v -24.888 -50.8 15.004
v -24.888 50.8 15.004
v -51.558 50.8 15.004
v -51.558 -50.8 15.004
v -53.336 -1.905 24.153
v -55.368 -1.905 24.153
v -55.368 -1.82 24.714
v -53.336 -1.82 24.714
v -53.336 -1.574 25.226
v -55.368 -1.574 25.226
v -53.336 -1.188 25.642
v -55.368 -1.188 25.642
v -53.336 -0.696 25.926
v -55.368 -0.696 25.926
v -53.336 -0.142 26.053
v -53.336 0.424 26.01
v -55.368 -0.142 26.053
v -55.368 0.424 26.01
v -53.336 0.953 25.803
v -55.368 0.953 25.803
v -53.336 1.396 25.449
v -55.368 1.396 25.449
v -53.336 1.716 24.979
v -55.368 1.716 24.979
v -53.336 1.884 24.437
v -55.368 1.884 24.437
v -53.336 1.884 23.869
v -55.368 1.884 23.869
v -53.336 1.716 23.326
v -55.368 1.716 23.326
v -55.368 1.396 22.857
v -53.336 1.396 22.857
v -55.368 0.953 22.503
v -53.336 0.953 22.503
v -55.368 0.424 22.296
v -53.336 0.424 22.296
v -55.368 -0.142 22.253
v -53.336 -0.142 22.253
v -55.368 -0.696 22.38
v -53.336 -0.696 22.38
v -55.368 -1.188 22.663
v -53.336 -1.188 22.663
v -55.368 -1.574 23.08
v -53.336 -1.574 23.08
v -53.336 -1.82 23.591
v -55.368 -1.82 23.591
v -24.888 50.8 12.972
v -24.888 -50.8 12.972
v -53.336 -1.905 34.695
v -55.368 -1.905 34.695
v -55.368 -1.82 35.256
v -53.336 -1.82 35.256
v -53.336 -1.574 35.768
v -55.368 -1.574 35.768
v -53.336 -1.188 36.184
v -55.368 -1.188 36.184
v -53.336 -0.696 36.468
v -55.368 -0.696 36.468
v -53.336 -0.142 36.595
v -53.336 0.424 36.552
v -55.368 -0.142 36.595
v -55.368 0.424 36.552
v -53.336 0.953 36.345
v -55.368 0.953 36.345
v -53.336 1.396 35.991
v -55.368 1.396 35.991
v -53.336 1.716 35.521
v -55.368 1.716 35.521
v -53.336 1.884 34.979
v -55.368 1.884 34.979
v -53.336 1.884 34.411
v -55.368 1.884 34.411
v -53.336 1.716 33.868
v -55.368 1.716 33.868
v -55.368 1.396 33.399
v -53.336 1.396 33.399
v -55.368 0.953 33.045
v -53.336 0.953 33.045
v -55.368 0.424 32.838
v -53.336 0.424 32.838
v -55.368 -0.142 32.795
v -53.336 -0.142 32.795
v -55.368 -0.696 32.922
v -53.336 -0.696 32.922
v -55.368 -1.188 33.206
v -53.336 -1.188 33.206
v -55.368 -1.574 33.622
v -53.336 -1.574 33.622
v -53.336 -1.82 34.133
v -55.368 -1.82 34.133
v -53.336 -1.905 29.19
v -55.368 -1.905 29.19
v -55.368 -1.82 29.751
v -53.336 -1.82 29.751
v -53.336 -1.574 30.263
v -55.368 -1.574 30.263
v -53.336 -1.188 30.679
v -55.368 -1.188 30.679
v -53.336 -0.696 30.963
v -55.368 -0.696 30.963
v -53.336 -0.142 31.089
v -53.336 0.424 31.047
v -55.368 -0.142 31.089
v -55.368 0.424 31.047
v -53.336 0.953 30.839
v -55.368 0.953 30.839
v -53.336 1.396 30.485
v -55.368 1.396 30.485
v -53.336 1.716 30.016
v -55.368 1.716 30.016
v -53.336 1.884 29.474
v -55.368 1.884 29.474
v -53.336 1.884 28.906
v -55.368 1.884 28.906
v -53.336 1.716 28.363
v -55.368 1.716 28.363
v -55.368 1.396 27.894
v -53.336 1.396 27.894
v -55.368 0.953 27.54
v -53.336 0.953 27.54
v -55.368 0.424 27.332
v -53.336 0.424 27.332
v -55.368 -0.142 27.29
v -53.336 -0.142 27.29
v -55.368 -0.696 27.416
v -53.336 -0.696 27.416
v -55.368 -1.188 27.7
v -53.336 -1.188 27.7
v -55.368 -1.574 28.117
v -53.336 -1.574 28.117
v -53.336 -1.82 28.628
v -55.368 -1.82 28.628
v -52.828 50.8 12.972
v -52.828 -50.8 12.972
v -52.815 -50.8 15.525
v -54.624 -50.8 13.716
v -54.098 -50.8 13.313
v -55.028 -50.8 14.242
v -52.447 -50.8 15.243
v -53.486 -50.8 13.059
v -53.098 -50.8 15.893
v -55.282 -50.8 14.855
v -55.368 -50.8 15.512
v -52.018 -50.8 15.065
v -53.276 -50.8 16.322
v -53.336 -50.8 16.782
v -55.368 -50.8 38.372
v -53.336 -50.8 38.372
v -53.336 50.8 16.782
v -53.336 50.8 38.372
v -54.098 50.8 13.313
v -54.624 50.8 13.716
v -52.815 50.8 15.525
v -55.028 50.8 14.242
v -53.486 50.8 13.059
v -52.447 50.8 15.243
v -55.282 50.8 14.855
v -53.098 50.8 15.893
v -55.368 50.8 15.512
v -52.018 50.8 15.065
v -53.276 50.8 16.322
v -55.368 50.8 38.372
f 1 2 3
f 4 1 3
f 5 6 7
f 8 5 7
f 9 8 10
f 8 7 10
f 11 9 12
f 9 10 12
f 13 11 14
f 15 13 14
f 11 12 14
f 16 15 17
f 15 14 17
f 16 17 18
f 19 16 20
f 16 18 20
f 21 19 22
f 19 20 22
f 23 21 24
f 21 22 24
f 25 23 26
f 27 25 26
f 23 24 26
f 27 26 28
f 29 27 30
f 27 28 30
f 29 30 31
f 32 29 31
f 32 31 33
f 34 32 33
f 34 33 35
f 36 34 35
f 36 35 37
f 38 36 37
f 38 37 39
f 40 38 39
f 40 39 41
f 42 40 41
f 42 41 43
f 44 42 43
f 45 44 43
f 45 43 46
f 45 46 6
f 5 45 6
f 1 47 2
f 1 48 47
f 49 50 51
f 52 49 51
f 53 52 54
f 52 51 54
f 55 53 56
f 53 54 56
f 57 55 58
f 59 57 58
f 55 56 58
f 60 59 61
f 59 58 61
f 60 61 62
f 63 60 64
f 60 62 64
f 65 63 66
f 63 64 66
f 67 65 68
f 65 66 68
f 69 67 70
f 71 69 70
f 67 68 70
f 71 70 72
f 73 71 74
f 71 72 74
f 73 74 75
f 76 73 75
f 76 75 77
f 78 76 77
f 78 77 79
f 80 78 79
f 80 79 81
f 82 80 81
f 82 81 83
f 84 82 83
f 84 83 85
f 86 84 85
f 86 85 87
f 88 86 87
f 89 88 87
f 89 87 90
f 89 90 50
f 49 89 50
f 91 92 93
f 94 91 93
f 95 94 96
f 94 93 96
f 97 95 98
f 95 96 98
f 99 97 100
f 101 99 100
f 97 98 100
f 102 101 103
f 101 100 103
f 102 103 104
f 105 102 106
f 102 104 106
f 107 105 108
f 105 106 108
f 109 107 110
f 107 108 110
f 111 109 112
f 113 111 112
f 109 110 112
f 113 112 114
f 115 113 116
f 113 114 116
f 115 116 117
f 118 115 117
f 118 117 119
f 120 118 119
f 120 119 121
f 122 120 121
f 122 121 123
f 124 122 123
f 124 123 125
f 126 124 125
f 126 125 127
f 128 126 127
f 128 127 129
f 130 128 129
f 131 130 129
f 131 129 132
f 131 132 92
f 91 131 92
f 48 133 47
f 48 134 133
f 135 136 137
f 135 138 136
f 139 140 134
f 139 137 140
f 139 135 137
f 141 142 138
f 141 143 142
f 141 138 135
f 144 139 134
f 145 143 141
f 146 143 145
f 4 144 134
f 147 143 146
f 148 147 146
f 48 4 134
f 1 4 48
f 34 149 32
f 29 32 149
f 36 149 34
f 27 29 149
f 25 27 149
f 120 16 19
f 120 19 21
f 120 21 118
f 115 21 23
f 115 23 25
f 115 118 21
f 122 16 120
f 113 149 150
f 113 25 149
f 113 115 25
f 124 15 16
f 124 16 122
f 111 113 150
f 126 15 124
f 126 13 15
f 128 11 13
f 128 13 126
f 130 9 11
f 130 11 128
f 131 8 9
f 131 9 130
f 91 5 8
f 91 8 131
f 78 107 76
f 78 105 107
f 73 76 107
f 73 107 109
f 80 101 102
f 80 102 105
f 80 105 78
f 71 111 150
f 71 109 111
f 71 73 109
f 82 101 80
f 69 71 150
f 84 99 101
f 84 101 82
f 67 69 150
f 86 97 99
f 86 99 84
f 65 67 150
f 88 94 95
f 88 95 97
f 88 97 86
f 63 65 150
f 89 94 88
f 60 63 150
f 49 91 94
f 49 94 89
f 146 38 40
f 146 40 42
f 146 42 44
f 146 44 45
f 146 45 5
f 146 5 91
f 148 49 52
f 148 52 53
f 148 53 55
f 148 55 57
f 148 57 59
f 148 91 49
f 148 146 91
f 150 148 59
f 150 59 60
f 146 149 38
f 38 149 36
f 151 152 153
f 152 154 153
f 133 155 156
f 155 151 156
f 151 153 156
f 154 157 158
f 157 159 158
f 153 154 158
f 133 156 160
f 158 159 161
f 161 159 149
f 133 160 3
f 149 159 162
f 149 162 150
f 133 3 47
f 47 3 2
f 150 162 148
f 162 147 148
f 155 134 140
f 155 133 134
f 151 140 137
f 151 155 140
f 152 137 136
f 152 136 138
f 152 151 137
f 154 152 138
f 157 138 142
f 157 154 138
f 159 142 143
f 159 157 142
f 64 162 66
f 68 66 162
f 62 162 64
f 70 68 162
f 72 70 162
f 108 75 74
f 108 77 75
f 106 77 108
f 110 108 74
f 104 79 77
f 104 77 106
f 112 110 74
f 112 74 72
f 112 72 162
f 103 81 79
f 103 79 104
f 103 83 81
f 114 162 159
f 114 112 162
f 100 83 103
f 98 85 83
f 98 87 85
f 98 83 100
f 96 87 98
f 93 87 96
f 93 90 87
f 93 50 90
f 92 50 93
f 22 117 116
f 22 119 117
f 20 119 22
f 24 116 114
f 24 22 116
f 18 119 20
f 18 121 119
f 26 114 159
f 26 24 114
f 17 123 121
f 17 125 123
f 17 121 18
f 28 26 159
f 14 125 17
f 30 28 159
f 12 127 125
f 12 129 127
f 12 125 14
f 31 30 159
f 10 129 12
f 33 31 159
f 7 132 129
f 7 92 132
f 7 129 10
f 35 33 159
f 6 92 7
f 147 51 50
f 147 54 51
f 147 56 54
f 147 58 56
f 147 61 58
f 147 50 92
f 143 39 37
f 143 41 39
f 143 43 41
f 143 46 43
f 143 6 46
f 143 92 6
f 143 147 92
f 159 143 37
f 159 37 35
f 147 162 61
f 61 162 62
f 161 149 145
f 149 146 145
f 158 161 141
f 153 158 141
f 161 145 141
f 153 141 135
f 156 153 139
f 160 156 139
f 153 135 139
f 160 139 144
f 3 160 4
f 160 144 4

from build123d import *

# Parameters (mm, degrees)
F0_W     = 28.448
F0_H     = 2.032
F0_W_2   = 2.032
F0_H_2   = 23.368
F1_DEPTH = 50.8
F2_R     = 2.54
F3_R     = 1.778
F5_D     = 3.81


with BuildPart() as f1:
    # F0 (on Front) → F1 (new body, symmetric)
    with BuildSketch(Plane.XZ):
        with Locations((-39.1122124221, 13.9883446444)):
            Rectangle(F0_W, F0_H)
        with Locations((-54.3522124221, 13.9883446444)):
            Rectangle(F0_W_2, F0_H)
        with Locations((-54.3522124221, 26.6883446444)):
            Rectangle(F0_W_2, F0_H_2)
    extrude(amount=F1_DEPTH, both=True)

    # F2
    f2_edges = [f1.edges().sort_by_distance(p)[0] for p in [
        (-55.368212, 0, 12.972345),
    ]]
    fillet(f2_edges, radius=F2_R)

    # F3
    f3_edges = [f1.edges().sort_by_distance(p)[0] for p in [
        (-53.336212, 0, 15.004345),
    ]]
    fillet(f3_edges, radius=F3_R)

    # F5 (through all)
    with Locations(Plane.YZ):
        with Locations((0, 34.6949249506), (0, 29.1896369308), (0, 24.1528842598)):
            Hole(F5_D / 2)


solid = f1.part
